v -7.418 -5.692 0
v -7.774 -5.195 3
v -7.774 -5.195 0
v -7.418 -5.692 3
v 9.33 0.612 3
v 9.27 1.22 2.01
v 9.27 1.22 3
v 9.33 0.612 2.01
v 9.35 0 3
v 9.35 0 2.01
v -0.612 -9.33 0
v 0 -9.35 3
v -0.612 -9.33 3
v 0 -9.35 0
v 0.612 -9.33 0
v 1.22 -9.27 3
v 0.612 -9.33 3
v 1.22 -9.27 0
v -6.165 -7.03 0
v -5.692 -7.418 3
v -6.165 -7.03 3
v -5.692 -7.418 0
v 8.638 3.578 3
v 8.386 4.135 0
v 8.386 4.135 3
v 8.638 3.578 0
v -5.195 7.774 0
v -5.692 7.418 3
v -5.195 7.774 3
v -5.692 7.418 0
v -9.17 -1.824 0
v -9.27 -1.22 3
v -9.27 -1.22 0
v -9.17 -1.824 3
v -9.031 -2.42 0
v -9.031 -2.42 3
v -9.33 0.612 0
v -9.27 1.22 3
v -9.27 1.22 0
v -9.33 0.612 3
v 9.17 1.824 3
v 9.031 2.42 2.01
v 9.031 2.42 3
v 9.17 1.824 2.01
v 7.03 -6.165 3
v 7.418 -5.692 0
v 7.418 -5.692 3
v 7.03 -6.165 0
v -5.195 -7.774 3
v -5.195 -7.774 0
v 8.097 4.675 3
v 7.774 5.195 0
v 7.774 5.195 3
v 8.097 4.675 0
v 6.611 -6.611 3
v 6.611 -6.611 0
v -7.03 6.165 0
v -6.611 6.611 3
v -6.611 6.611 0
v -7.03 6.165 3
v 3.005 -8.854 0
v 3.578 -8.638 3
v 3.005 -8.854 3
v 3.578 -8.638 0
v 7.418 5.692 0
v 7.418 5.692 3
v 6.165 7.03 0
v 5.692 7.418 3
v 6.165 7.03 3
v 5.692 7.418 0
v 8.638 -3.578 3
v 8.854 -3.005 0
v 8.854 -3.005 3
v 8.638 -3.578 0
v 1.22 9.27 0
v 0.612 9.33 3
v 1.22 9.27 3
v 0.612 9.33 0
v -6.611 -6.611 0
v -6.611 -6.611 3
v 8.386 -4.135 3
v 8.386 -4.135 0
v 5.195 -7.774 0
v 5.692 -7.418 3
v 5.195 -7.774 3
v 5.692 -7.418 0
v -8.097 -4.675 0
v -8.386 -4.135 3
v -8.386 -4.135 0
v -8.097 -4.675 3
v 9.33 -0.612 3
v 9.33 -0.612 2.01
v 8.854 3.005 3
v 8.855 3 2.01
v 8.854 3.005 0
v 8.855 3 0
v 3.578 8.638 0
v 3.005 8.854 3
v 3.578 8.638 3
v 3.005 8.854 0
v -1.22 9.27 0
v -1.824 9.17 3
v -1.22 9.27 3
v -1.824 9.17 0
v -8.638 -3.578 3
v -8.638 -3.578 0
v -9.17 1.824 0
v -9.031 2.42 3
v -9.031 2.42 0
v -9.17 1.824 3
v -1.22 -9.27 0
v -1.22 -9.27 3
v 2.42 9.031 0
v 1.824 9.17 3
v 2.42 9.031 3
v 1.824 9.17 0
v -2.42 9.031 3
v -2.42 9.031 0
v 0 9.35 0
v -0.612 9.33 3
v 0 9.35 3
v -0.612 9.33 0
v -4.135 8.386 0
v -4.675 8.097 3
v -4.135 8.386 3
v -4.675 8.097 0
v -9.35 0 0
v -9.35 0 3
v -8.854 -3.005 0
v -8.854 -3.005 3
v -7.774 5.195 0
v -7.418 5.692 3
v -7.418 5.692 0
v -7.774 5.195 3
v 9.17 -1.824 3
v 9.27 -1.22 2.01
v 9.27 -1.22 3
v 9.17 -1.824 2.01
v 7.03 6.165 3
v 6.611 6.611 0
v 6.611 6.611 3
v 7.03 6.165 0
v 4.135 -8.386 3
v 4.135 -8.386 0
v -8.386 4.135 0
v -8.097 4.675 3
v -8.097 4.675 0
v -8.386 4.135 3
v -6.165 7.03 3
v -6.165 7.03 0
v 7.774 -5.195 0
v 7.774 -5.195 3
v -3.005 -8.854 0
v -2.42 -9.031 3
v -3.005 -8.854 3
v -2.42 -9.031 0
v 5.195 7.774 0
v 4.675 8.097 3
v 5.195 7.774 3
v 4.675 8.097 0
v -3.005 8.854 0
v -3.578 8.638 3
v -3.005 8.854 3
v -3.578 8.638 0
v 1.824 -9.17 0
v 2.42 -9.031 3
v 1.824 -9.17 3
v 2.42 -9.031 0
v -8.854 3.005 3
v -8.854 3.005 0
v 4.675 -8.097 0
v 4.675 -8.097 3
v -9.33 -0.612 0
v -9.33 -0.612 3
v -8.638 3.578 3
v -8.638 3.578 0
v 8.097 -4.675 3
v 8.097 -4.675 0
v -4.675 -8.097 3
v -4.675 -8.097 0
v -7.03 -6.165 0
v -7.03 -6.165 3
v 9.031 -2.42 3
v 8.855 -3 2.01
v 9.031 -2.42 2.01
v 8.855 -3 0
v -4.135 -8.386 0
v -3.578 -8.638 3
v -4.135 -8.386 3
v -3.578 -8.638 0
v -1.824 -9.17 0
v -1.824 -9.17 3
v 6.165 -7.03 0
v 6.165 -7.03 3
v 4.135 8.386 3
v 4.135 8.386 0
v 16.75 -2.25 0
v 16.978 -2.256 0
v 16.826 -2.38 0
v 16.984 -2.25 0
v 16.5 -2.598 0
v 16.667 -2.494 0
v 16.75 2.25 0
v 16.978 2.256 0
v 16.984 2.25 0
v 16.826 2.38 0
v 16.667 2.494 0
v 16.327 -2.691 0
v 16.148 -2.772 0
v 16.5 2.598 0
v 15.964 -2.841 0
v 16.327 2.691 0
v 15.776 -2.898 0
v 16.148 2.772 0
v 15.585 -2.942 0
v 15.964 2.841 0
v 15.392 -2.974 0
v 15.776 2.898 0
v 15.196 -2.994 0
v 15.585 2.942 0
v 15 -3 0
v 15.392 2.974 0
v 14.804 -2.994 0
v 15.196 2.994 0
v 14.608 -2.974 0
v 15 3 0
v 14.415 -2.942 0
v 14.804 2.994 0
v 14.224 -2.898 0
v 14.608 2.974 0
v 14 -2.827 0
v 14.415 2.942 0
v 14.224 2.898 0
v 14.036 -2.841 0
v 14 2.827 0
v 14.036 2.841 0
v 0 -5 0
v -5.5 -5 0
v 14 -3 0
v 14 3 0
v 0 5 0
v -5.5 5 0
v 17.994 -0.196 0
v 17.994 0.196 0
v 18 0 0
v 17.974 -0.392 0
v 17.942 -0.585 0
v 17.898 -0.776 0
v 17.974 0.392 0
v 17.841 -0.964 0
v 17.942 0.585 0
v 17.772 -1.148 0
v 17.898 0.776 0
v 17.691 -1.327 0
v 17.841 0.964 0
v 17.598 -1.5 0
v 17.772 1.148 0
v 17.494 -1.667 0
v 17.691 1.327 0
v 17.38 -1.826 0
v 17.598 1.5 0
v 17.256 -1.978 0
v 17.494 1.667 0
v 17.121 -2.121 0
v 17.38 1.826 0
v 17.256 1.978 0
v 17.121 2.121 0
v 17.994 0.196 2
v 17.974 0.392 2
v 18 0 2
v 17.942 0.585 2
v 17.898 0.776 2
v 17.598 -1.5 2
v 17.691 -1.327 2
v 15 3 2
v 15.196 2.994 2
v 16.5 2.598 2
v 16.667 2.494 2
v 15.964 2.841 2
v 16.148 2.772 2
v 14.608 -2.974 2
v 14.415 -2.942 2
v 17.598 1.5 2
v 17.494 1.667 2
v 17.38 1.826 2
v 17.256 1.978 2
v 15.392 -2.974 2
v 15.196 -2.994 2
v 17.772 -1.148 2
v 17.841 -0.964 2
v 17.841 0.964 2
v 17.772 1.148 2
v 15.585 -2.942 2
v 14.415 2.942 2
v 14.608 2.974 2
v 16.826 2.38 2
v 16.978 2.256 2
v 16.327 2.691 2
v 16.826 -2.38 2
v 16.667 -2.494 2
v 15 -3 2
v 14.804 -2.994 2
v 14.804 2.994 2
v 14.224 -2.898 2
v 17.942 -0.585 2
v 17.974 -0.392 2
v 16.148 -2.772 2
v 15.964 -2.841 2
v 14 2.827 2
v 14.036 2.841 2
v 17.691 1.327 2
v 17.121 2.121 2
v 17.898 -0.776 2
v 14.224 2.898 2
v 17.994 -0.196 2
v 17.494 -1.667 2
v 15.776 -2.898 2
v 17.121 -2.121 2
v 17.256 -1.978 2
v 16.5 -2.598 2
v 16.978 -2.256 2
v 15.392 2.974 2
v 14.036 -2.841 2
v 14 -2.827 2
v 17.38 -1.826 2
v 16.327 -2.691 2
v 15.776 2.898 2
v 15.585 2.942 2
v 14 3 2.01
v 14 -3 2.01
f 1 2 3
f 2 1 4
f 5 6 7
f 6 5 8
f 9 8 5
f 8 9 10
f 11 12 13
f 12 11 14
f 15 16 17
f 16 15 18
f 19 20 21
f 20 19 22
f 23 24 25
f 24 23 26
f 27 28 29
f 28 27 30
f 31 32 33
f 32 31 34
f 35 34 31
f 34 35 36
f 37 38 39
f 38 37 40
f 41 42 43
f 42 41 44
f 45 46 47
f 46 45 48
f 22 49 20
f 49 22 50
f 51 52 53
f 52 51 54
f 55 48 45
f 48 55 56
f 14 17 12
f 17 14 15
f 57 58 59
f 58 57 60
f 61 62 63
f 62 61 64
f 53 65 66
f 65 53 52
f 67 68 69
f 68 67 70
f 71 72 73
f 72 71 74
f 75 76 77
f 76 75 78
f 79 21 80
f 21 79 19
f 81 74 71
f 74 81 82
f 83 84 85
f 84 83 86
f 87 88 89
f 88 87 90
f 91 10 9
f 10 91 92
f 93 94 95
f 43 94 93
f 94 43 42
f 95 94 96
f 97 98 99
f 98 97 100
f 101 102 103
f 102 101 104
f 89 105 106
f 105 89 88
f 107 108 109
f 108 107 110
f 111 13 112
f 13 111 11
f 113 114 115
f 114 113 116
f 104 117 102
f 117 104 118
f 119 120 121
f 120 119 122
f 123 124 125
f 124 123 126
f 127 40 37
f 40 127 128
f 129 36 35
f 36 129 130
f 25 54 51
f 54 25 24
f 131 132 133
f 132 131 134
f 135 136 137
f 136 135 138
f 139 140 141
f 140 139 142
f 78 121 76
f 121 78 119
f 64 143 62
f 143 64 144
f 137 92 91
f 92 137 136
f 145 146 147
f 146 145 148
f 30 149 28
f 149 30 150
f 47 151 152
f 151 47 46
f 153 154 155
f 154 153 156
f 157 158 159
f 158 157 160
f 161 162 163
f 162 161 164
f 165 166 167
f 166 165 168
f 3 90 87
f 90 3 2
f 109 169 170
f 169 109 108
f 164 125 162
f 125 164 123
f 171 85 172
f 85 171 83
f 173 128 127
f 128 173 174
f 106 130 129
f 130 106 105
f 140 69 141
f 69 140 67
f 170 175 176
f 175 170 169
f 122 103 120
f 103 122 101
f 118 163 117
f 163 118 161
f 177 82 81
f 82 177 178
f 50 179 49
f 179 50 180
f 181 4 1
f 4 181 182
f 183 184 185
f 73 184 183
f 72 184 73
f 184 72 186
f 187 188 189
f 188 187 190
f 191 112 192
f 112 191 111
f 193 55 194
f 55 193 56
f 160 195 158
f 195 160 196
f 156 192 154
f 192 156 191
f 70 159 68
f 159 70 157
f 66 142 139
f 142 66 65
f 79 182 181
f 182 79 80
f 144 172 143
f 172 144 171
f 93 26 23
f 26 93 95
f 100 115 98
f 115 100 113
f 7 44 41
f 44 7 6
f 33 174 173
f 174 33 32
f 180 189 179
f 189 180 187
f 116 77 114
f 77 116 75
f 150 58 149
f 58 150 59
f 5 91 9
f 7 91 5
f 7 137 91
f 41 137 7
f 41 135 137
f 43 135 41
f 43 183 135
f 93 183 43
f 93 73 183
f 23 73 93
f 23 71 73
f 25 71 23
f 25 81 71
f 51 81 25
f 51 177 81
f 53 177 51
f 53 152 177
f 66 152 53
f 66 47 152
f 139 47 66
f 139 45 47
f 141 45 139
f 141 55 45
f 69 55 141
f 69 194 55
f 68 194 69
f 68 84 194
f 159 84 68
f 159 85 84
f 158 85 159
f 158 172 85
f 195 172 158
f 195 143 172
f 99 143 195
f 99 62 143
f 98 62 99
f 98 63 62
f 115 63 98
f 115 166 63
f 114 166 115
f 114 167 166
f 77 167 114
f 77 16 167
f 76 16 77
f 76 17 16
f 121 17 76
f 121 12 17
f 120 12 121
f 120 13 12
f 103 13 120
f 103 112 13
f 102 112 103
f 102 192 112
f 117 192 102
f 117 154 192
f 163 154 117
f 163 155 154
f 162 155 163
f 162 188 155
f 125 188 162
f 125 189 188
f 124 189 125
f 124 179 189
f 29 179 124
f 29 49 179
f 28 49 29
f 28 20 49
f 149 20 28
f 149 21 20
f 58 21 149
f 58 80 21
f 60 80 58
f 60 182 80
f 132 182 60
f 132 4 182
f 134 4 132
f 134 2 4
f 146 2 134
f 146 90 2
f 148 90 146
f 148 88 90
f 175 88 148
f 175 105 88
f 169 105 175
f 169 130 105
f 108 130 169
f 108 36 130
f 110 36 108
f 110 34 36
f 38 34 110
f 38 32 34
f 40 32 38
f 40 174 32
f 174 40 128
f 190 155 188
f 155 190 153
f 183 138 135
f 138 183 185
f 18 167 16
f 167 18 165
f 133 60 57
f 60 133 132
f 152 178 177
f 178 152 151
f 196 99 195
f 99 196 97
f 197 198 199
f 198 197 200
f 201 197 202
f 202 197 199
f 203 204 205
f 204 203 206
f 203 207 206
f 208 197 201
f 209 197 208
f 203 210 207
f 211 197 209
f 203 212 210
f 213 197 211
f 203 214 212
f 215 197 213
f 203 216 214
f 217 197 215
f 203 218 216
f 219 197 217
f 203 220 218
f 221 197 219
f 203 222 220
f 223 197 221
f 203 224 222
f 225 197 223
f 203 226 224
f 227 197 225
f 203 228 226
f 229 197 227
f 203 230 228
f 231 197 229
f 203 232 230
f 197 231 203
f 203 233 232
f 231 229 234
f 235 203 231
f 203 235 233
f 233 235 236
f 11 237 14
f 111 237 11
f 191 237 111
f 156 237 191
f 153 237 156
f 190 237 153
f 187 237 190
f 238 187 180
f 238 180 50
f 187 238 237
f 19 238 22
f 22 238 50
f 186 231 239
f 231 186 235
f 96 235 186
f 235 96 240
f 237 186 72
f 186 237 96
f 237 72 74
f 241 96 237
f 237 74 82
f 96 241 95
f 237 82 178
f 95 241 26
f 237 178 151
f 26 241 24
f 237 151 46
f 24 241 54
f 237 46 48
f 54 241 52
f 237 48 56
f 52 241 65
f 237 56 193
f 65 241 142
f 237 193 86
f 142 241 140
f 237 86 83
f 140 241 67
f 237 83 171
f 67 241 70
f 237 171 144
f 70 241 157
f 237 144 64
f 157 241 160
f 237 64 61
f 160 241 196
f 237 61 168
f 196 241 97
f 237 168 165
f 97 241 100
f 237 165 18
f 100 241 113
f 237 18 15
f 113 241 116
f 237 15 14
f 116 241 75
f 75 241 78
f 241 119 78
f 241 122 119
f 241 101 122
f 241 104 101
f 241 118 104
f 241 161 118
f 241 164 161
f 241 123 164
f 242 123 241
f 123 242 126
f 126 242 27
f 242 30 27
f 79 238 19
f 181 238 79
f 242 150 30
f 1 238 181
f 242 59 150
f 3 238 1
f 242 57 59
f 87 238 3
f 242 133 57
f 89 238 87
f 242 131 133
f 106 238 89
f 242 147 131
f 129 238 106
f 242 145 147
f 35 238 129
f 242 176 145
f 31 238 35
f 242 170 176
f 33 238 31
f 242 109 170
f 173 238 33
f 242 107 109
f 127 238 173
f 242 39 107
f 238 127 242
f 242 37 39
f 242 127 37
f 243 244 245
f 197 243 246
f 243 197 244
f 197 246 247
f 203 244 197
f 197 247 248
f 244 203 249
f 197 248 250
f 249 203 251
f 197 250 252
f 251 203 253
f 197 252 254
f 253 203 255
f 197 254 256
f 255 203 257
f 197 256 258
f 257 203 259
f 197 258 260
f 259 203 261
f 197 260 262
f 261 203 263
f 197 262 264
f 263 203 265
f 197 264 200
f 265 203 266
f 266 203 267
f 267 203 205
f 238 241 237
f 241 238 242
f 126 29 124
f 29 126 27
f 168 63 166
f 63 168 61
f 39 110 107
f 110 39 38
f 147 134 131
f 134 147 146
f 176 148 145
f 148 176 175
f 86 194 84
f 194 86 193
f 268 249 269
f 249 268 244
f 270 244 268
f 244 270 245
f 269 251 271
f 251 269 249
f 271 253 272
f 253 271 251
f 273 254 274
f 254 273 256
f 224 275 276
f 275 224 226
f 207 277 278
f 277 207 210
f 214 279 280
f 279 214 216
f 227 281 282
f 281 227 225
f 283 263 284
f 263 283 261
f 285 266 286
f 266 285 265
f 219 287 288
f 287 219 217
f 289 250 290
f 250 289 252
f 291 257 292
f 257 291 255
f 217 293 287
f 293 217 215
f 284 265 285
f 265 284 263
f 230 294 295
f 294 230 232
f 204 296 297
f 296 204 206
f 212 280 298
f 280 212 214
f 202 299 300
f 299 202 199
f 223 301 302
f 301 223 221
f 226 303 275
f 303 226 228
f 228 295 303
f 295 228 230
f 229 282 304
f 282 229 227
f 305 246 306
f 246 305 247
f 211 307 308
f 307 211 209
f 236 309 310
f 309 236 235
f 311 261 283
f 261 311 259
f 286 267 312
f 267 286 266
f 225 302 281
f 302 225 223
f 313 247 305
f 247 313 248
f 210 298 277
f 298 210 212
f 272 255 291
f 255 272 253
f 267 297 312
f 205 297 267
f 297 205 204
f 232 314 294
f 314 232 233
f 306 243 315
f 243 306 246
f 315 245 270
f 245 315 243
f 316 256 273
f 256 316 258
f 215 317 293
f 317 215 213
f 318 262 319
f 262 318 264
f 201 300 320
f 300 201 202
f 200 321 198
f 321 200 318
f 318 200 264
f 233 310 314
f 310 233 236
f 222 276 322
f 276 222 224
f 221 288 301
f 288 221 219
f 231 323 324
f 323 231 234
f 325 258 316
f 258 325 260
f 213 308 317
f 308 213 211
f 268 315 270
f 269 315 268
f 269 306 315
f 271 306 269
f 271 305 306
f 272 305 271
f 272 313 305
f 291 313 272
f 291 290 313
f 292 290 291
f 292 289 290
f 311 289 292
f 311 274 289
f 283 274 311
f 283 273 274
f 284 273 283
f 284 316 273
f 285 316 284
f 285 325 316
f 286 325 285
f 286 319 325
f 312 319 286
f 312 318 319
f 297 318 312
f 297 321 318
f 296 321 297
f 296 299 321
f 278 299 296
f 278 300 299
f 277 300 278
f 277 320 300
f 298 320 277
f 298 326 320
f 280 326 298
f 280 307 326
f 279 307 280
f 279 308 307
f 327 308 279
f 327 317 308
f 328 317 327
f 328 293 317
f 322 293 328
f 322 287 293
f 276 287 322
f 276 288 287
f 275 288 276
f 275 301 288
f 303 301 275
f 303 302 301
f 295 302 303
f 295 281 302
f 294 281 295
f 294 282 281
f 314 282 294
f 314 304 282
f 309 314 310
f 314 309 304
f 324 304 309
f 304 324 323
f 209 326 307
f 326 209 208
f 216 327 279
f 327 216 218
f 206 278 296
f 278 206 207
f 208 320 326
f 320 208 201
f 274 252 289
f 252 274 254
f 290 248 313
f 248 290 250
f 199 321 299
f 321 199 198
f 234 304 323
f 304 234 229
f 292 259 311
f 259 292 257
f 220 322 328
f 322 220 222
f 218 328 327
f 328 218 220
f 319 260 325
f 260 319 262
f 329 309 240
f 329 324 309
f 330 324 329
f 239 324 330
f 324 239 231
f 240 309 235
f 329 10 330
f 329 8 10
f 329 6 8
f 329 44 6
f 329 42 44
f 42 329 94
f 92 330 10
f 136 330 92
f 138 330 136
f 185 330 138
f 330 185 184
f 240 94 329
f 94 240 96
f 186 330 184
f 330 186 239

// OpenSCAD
// Snap-on tubing clip for a 12.7 mm lab stand rod
// Print orientation: flat on the bed, extruded along +Z

// ---------------- Parameters ----------------
ring_od      = 18.7;   // rod ring outer diameter (12.7 mm ID + 2*wall)
ring_w       = 3;      // rod ring wall thickness
ring_open    = 10;     // width of the -X side opening on the rod ring

tube_od      = 6;      // tubing ring outer diameter (6 mm ID + 2*wall)
tube_w       = 2;      // tubing ring wall thickness
tube_x       = 15;     // centre X of the tubing ring
tube_open    = 4.5;    // width of the +X side opening on the tubing ring

bridge_w     = 6;      // bridge width along Y (X from 8 to 12)
eps          = 0.5;    // cutter overshoot past faces

$fn = 96;

// ---------------- Model ----------------
difference() {
    union() {
        // Rod ring
        translate([0, 0, 0])
            cylinder(h = ring_w, d = ring_od);
        // Tubing ring
        translate([tube_x, 0, 0])
            cylinder(h = tube_w, d = tube_od);
        // Solid bridge between the two rings
        translate([8, -bridge_w / 2, 0])
            cube([bridge_w, bridge_w, tube_w + 0.01]);
    }

    // Opening in the rod ring (x < 0, -5 < y < 5)
    translate([-ring_open / 2 - eps, -5, -eps])
        cube([ring_open / 2 + eps, 10, eps]);

    // Opening in the tubing ring (x > 15, -2.25 < y < 2.25)
    translate([tube_x + tube_open / 2 - eps, -2.25, -eps])
        cube([tube_open / 2 + eps, 4.5, eps]);
}
